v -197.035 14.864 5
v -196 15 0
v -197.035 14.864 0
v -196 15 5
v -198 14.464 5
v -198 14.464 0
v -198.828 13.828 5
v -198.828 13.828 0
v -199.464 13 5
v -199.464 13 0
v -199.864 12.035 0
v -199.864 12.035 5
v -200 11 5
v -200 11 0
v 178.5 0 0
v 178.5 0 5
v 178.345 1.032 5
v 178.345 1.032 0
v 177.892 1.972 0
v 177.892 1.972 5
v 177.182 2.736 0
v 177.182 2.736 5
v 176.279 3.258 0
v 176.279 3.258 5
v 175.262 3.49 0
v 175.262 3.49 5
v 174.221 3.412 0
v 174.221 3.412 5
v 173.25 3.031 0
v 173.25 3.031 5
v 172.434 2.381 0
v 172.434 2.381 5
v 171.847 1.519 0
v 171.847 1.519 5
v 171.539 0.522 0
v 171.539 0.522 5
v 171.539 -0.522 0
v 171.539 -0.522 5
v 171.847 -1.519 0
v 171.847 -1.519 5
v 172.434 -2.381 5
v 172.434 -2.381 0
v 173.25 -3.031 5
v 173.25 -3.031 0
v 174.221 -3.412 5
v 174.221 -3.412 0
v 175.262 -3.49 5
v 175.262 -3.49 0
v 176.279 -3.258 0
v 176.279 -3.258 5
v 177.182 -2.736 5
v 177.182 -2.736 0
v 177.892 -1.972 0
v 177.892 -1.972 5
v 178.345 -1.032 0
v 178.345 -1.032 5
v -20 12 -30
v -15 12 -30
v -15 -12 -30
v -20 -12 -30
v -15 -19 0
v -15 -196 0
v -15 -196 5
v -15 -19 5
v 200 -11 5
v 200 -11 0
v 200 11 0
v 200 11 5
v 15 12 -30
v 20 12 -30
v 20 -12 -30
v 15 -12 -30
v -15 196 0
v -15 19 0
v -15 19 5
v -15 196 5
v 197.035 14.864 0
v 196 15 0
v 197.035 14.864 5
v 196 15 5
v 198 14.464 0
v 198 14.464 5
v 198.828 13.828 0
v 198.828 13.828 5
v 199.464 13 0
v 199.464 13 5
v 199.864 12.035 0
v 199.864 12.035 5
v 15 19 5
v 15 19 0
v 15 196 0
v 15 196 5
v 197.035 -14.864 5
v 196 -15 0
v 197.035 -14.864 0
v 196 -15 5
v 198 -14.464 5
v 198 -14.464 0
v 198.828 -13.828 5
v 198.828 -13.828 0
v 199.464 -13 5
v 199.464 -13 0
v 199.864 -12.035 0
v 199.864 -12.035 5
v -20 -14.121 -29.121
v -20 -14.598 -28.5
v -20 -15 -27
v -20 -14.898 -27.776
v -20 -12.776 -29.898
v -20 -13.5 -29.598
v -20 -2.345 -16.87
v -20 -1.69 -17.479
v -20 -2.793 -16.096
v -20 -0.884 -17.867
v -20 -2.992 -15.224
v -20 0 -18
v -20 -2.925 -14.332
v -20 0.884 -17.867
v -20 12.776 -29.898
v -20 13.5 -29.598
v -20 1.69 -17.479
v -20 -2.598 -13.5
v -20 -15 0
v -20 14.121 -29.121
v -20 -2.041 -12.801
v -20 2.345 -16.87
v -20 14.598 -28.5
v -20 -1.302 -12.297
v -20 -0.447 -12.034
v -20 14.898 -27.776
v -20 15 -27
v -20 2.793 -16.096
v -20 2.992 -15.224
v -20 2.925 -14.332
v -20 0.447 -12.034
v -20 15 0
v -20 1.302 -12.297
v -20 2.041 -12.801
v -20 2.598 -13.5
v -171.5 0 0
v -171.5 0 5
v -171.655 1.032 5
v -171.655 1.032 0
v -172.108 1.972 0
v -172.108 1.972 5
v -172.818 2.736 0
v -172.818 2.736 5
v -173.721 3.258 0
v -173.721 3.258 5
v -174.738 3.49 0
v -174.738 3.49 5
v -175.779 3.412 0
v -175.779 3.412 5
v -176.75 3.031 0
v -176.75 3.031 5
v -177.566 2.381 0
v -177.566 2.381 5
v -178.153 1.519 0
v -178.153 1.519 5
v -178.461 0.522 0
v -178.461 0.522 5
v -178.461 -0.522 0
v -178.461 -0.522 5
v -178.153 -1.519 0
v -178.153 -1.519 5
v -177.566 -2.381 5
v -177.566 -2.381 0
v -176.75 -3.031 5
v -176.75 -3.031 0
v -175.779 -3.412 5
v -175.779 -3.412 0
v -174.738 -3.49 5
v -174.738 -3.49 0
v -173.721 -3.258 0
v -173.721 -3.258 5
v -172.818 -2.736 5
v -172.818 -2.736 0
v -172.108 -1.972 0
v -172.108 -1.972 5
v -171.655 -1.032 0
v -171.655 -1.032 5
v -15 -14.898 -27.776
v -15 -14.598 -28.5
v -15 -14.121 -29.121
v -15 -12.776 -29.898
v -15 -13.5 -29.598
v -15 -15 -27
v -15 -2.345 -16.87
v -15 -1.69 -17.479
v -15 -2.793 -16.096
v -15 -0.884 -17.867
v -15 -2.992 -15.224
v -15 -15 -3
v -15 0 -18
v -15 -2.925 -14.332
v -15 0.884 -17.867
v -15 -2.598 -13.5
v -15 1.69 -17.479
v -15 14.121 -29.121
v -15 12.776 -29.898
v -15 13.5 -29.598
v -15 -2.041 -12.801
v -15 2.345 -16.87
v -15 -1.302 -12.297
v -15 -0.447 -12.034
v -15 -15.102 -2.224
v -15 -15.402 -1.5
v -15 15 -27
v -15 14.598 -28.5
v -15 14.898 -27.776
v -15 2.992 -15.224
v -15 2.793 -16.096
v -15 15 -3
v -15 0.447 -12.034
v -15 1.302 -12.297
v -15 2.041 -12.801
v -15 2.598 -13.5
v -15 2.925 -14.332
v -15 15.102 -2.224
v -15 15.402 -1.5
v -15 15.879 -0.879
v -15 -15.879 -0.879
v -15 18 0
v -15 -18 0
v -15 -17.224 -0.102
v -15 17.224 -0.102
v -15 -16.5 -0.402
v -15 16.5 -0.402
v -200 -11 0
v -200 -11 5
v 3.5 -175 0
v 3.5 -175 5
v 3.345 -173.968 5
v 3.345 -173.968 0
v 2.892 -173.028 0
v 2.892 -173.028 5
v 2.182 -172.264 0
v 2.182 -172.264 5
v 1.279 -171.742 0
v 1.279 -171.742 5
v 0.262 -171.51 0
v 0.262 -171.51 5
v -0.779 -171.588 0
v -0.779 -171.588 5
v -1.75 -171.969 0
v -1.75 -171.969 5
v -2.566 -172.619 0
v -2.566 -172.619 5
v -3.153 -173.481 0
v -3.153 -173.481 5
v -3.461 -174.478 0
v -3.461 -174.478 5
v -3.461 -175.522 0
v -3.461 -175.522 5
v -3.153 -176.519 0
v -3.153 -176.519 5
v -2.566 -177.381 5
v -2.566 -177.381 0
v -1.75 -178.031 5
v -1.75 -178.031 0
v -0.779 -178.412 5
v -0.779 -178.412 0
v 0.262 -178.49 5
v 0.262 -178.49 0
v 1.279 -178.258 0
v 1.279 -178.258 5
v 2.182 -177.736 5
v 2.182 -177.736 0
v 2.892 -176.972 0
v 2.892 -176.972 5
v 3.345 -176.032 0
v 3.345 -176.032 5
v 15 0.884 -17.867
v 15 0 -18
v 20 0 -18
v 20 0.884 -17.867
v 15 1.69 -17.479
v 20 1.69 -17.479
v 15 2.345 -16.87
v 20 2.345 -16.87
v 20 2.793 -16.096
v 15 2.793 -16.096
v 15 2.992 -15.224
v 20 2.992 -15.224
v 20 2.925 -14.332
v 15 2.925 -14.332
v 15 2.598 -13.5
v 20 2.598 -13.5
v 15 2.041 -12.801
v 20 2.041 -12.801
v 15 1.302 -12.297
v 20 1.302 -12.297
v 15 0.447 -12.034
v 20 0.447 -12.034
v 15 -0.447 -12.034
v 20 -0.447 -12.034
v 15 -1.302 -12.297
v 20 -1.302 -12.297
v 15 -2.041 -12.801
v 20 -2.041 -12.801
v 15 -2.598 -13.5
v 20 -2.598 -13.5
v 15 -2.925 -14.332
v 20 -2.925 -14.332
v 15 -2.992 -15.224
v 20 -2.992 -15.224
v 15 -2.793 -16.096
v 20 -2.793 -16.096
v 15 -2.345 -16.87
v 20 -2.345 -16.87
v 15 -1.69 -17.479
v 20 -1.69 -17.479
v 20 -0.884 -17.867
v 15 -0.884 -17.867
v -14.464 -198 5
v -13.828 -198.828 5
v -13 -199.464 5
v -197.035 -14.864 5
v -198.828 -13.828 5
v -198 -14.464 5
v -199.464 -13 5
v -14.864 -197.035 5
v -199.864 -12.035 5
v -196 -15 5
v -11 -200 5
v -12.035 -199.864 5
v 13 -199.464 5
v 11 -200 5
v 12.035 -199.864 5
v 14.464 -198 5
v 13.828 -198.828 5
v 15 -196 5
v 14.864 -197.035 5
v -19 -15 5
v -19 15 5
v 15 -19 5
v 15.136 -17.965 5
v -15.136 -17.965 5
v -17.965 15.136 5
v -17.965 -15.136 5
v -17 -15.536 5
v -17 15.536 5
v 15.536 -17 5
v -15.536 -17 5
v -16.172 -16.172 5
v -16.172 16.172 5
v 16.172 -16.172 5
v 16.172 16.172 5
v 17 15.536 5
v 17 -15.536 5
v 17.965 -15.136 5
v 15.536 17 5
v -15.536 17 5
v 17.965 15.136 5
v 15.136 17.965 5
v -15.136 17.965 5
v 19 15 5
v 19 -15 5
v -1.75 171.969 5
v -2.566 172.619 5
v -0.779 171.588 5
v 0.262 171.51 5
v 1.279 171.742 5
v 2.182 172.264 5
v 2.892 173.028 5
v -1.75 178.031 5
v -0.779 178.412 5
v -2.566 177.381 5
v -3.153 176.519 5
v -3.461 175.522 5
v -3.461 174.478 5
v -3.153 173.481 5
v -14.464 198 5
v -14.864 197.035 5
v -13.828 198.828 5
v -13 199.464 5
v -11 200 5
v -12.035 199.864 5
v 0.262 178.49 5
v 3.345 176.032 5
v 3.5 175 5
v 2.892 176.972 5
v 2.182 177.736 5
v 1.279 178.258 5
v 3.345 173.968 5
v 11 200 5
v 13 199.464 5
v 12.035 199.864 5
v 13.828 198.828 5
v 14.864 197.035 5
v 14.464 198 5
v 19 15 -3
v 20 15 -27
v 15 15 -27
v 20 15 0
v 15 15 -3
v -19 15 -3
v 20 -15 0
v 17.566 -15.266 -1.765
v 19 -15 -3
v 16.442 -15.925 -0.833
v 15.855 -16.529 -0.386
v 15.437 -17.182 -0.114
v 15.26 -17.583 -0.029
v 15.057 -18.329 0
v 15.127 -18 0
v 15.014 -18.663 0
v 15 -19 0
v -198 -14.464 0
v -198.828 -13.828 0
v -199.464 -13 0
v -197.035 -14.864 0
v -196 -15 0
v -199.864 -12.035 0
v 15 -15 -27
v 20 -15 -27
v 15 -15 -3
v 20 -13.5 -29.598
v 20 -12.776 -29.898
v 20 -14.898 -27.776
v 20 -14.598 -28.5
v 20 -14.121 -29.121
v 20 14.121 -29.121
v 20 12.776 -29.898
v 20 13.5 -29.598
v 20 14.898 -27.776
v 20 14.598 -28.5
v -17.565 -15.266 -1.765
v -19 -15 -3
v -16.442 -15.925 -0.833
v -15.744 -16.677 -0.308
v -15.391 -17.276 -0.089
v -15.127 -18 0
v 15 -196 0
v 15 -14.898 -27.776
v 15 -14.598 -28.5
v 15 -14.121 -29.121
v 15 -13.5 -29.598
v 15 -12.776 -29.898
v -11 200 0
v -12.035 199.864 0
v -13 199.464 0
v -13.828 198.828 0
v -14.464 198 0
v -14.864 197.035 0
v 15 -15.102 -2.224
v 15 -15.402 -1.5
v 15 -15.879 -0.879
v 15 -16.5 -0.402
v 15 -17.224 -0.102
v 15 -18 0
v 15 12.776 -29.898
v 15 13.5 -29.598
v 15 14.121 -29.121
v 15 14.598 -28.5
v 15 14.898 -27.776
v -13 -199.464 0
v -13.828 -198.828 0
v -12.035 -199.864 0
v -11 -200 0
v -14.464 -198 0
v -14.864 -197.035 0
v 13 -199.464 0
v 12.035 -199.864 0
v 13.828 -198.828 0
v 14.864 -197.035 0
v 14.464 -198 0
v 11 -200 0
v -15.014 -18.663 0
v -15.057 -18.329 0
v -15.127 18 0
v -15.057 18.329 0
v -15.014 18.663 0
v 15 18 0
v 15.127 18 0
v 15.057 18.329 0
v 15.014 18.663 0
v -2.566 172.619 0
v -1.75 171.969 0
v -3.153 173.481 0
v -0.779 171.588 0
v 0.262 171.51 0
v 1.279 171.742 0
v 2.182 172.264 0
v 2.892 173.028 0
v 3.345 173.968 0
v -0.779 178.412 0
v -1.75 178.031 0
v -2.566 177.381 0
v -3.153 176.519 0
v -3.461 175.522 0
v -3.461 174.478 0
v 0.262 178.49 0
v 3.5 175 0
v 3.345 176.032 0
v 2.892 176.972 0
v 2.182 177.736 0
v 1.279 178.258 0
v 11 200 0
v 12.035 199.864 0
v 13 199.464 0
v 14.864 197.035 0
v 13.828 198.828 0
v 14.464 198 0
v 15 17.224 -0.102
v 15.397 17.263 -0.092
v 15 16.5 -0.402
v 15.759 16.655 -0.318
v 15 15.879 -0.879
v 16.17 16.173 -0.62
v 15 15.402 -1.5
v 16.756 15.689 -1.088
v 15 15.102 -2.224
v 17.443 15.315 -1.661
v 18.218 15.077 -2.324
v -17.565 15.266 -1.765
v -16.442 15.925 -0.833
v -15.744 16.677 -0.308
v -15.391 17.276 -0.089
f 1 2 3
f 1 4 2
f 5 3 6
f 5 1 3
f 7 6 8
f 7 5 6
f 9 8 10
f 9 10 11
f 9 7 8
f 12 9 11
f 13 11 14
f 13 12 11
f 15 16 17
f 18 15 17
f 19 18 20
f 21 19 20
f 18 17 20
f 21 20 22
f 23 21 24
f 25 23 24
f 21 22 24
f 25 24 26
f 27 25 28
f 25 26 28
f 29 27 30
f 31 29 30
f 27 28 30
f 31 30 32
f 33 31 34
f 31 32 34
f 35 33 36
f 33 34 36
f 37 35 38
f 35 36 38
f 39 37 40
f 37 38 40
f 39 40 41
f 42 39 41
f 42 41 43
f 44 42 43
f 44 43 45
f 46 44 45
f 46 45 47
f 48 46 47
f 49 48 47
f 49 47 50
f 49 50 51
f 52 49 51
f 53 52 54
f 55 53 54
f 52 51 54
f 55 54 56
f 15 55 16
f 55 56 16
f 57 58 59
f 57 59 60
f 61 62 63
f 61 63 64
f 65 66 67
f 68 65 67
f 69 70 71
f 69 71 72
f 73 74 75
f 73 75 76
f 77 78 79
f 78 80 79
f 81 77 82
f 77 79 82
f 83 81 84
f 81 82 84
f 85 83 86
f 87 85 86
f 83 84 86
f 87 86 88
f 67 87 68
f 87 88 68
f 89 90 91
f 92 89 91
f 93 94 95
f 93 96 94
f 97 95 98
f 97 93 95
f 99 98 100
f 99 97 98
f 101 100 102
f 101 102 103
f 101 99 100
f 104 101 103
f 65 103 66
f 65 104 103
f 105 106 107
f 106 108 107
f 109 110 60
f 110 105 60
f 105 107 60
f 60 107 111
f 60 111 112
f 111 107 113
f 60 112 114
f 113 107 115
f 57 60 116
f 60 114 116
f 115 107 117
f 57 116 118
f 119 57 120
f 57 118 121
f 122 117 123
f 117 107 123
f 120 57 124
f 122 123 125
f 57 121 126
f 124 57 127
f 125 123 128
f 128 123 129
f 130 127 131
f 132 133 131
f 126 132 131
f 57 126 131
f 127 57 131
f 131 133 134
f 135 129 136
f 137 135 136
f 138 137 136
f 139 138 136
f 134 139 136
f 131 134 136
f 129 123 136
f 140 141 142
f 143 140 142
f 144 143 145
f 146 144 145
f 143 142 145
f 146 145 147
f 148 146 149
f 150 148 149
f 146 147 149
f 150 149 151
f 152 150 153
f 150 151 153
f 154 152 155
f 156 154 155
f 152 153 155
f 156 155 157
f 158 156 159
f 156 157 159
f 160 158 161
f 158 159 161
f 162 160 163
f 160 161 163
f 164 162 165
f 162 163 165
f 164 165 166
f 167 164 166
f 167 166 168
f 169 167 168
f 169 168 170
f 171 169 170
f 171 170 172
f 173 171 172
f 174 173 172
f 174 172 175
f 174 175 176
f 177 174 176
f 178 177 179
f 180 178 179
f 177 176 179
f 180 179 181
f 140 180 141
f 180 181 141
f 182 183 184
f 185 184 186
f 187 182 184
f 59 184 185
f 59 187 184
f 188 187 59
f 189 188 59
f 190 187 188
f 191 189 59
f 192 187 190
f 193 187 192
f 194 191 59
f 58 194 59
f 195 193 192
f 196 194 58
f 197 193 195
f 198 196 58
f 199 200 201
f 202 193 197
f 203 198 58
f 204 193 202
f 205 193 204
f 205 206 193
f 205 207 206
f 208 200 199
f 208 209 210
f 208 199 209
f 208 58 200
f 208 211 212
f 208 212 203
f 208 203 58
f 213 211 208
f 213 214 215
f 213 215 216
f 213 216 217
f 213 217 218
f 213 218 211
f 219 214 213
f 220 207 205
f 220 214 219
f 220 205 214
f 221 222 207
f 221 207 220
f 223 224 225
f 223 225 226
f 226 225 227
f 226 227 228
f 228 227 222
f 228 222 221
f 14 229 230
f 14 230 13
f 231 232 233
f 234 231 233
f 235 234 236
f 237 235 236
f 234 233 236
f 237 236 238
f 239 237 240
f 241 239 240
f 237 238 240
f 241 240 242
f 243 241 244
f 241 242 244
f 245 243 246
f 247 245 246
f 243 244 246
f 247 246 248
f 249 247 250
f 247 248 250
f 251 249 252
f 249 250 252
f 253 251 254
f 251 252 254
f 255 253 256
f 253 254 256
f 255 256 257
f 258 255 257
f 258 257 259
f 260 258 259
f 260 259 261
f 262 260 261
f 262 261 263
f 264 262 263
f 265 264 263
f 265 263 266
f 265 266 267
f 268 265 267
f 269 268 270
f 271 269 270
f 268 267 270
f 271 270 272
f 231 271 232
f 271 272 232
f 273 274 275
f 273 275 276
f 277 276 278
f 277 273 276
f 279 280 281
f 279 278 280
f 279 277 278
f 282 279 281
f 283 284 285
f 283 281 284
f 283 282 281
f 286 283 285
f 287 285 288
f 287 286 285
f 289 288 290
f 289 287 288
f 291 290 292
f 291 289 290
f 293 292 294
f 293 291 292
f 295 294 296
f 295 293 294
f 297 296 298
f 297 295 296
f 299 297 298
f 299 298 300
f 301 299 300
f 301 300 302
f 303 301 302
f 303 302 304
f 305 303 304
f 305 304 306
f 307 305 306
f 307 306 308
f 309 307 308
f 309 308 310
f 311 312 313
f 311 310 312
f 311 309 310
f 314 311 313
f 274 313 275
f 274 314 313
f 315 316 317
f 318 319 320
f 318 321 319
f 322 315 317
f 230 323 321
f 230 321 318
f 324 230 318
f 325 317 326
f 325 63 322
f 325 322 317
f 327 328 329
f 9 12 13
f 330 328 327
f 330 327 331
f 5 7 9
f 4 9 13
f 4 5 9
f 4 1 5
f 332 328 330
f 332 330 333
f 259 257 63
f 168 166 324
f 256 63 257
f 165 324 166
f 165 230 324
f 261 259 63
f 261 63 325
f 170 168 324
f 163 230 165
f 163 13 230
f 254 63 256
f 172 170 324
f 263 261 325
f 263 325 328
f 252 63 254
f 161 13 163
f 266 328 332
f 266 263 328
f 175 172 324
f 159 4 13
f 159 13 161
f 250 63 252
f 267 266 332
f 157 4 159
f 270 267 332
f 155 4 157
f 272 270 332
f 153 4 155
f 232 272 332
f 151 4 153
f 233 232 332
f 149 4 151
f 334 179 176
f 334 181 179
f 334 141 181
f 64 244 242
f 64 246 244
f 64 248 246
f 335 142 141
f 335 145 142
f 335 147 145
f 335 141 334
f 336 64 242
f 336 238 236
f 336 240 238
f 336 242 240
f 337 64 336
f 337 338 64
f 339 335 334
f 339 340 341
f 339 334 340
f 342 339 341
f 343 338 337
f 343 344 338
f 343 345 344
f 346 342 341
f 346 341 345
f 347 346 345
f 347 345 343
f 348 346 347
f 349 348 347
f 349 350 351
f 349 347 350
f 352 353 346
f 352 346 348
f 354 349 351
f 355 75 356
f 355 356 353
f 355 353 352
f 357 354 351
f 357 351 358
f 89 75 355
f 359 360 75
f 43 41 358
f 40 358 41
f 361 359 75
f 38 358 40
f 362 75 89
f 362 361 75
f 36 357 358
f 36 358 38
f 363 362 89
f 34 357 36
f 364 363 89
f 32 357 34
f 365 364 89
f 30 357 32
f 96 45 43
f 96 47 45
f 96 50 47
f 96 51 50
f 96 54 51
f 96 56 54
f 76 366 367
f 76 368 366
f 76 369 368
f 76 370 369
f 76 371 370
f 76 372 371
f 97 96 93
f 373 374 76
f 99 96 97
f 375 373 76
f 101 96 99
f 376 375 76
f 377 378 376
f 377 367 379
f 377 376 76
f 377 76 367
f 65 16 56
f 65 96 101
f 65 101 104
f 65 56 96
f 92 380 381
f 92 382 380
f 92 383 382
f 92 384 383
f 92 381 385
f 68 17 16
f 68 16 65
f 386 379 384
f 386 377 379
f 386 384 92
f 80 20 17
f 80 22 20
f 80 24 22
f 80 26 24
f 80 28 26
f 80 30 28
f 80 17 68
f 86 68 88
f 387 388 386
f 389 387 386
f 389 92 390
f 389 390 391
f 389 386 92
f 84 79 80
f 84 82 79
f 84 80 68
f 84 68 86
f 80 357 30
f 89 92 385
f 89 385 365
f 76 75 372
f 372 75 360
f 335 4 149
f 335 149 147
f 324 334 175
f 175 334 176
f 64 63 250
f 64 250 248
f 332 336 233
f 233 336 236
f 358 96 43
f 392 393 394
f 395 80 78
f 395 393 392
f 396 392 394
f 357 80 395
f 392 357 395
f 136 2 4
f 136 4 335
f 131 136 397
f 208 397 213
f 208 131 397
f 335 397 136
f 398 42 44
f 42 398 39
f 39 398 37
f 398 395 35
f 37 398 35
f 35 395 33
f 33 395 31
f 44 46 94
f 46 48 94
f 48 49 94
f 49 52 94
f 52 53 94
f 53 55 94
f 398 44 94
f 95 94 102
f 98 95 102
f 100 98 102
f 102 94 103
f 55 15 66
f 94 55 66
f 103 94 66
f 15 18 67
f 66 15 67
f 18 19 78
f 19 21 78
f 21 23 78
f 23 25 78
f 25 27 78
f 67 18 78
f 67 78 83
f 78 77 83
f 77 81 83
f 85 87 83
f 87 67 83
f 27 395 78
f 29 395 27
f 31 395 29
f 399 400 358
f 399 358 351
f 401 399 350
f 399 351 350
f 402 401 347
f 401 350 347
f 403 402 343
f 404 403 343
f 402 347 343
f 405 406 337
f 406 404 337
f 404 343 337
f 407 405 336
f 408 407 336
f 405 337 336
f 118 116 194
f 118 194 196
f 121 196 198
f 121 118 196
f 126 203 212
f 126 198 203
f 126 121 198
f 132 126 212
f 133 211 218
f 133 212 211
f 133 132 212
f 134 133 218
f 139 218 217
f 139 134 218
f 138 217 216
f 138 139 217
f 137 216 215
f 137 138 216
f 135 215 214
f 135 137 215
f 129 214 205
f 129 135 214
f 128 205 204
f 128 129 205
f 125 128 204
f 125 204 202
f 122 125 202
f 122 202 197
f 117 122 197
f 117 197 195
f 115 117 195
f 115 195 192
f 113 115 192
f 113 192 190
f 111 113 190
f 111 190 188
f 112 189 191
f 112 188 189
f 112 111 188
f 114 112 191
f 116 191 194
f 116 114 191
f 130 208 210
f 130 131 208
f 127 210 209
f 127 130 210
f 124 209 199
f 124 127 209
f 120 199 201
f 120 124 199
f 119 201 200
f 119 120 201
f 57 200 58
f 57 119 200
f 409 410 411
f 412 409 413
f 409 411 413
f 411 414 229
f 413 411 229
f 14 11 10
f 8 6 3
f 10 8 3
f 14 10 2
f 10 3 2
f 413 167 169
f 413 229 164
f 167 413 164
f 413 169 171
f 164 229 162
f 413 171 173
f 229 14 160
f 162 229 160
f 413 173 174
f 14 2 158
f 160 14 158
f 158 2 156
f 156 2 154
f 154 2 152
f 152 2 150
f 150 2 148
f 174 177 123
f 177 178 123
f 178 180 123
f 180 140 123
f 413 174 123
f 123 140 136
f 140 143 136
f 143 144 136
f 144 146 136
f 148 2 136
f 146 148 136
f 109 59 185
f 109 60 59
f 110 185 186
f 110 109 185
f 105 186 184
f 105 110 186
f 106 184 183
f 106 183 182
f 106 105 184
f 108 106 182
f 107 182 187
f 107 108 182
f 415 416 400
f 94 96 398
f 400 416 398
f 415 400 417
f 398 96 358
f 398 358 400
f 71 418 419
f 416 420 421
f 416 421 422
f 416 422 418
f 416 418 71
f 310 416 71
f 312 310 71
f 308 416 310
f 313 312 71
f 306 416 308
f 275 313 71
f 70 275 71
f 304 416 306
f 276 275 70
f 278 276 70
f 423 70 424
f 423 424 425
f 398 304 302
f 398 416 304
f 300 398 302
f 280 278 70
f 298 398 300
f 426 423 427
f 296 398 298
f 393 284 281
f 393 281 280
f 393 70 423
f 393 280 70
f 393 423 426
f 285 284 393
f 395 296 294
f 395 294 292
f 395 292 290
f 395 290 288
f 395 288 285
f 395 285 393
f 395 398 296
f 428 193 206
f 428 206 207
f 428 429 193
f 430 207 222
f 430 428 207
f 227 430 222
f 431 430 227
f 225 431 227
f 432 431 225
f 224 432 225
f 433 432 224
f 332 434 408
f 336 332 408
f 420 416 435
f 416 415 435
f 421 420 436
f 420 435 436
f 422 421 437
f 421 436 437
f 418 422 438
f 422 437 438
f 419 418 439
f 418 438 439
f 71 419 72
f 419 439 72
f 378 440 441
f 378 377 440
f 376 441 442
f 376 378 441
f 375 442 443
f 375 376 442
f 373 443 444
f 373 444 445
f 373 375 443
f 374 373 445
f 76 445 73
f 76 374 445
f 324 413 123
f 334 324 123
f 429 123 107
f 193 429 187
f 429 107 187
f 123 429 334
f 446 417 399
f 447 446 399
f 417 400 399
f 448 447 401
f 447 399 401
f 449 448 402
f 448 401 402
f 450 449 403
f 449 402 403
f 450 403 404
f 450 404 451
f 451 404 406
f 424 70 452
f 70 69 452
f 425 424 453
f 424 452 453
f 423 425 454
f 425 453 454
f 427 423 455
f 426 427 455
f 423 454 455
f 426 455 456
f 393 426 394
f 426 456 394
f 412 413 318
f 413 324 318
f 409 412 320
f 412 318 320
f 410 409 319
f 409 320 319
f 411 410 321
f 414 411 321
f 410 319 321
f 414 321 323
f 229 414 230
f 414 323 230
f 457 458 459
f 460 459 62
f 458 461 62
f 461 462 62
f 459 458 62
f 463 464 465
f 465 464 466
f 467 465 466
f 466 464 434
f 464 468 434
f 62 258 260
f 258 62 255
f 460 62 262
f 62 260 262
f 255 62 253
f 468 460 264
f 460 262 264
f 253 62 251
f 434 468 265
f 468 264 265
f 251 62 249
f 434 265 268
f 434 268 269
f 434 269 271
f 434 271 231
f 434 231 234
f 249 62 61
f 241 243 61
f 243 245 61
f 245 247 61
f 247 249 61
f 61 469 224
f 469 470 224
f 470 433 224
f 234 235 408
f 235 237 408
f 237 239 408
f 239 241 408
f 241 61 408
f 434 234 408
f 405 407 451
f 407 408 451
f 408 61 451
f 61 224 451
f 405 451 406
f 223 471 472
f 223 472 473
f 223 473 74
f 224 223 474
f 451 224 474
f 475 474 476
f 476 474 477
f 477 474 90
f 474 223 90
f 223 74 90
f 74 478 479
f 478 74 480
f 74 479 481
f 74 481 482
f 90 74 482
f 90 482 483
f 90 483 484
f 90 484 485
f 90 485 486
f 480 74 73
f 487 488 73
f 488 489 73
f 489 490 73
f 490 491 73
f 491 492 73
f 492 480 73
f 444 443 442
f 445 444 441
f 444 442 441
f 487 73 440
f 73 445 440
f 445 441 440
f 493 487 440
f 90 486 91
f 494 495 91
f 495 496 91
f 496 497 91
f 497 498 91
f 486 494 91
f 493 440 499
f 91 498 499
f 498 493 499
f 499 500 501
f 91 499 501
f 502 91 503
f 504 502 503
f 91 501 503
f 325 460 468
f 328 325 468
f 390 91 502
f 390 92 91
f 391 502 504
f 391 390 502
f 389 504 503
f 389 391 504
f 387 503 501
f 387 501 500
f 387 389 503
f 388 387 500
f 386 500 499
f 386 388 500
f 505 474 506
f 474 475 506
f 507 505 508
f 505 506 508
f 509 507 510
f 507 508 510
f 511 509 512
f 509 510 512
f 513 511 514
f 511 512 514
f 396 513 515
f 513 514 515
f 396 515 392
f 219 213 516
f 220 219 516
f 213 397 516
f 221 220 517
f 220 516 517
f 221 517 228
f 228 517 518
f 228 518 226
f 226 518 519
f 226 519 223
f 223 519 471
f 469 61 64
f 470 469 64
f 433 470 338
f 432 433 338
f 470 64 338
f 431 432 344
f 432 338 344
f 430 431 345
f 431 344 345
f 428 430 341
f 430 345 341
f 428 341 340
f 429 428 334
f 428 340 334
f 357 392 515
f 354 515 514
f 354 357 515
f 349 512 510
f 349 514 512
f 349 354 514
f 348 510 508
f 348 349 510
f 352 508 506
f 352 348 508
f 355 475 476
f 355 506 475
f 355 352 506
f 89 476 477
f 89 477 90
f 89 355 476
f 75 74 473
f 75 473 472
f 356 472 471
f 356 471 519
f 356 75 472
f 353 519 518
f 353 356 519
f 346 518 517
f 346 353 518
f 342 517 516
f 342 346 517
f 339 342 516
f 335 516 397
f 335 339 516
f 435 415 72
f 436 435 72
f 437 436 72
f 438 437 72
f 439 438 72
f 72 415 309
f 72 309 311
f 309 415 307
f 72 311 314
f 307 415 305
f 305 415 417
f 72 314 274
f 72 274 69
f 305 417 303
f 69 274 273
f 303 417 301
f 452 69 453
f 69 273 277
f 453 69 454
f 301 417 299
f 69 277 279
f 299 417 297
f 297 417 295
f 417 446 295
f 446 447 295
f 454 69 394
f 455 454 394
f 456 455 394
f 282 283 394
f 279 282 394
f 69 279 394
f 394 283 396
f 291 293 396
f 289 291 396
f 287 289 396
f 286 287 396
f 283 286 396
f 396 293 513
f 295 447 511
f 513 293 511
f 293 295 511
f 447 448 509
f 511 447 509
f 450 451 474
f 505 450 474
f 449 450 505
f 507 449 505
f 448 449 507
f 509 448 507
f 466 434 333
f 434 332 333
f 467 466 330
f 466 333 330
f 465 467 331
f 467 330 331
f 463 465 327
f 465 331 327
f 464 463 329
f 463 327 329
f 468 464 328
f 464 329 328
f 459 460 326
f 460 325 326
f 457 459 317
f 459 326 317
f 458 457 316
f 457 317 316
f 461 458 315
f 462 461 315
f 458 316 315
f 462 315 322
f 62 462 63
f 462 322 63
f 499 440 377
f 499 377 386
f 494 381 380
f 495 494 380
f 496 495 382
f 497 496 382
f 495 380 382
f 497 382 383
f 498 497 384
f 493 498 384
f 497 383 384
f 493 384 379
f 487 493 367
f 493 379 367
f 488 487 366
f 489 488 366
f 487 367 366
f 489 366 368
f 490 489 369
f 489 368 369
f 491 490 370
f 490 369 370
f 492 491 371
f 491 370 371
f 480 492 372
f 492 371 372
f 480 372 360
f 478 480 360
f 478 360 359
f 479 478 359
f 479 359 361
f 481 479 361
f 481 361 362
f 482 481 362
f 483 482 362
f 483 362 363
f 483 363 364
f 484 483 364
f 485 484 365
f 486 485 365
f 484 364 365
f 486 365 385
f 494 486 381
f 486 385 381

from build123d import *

# Parameters (mm, degrees)
SKETCH1_W               = 185
SKETCH1_H               = 30
SKETCH1_W_2             = 30
SKETCH1_H_2             = 185
BOSS_EXTRUDE1_DEPTH     = 5
SKETCH2_W               = 5
SKETCH2_H               = 30
BOSS_EXTRUDE2_DEPTH     = 30
CUT_EXTRUDE1_DEPTH      = 299.83105595
CUT_EXTRUDE1_DEPTH_BACK = 299.83105595
SKETCH3_R               = 3
SKETCH4_R               = 3.5
CUT_EXTRUDE2_DEPTH      = 5
FILLET1_R               = 4
FILLET2_R               = 3
FILLET3_R               = 3


with BuildPart() as part:
    # Sketch1 → Boss-Extrude1 (new body)
    with BuildSketch(Plane.XY):
        with Locations((107.5, 0)):
            Rectangle(SKETCH1_W, SKETCH1_H)
        with Locations((0, 107.5)):
            Rectangle(SKETCH1_W_2, SKETCH1_H_2)
        with Locations((-107.5, 0)):
            Rectangle(SKETCH1_W, SKETCH1_H)
        Rectangle(SKETCH1_W_2, SKETCH1_H)
        with Locations((0, -107.5)):
            Rectangle(SKETCH1_W_2, SKETCH1_H_2)
    extrude(amount=BOSS_EXTRUDE1_DEPTH)

    # Sketch2 → Boss-Extrude2 (add)
    with BuildSketch(Plane(origin=(0, 0, 0), x_dir=(-1, 0, 0), z_dir=(0, 0, -1))):
        with Locations((-17.5, 0)):
            Rectangle(SKETCH2_W, SKETCH2_H)
        with Locations((17.5, 0)):
            Rectangle(SKETCH2_W, SKETCH2_H)
    extrude(amount=BOSS_EXTRUDE2_DEPTH)

    # Sketch3 → Cut-Extrude1 (cut, two sides: drawn at the far end of the back side and taken through both)
    with BuildSketch(Plane(origin=(20, 0, 0), x_dir=(0, 0, -1), z_dir=(1, 0, 0)).offset(-CUT_EXTRUDE1_DEPTH_BACK)):
        with Locations((15, 0)):
            Circle(SKETCH3_R)
    extrude(amount=CUT_EXTRUDE1_DEPTH + CUT_EXTRUDE1_DEPTH_BACK, mode=Mode.SUBTRACT)

    # Sketch4 → Cut-Extrude2 (cut)
    with BuildSketch(Plane.XY.offset(5)):
        with Locations((0, 175)):
            Circle(SKETCH4_R)
        with Locations((175, 0)):
            Circle(SKETCH4_R)
        with Locations((0, -175)):
            Circle(SKETCH4_R)
        with Locations((-175, 0)):
            Circle(SKETCH4_R)
    extrude(amount=-CUT_EXTRUDE2_DEPTH, mode=Mode.SUBTRACT)

    # Fillet1
    fillet1_edges = [part.edges().sort_by_distance(p)[0] for p in [
        (200, -15, 2.5),
        (15, -15, 2.5),
        (15, -200, 2.5),
        (-15, -200, 2.5),
        (-15, -15, 2.5),
        (-200, -15, 2.5),
        (-200, 15, 2.5),
        (-15, 15, 2.5),
        (-15, 200, 2.5),
        (15, 200, 2.5),
        (15, 15, 2.5),
        (200, 15, 2.5),
    ]]
    fillet(fillet1_edges, radius=FILLET1_R)

    # Fillet2
    fillet2_edges = [part.edges().sort_by_distance(p)[0] for p in [
        (17, -15, 0),
        (17, 15, 0),
        (17.5, 15, -30),
        (17.5, -15, -30),
    ]]
    fillet(fillet2_edges, radius=FILLET2_R)

    # Fillet3
    fillet3_edges = [part.edges().sort_by_distance(p)[0] for p in [
        (-17, -15, 0),
        (-17, 15, 0),
        (-17.5, -15, -30),
        (-17.5, 15, -30),
    ]]
    fillet(fillet3_edges, radius=FILLET3_R)


solid = part.part
